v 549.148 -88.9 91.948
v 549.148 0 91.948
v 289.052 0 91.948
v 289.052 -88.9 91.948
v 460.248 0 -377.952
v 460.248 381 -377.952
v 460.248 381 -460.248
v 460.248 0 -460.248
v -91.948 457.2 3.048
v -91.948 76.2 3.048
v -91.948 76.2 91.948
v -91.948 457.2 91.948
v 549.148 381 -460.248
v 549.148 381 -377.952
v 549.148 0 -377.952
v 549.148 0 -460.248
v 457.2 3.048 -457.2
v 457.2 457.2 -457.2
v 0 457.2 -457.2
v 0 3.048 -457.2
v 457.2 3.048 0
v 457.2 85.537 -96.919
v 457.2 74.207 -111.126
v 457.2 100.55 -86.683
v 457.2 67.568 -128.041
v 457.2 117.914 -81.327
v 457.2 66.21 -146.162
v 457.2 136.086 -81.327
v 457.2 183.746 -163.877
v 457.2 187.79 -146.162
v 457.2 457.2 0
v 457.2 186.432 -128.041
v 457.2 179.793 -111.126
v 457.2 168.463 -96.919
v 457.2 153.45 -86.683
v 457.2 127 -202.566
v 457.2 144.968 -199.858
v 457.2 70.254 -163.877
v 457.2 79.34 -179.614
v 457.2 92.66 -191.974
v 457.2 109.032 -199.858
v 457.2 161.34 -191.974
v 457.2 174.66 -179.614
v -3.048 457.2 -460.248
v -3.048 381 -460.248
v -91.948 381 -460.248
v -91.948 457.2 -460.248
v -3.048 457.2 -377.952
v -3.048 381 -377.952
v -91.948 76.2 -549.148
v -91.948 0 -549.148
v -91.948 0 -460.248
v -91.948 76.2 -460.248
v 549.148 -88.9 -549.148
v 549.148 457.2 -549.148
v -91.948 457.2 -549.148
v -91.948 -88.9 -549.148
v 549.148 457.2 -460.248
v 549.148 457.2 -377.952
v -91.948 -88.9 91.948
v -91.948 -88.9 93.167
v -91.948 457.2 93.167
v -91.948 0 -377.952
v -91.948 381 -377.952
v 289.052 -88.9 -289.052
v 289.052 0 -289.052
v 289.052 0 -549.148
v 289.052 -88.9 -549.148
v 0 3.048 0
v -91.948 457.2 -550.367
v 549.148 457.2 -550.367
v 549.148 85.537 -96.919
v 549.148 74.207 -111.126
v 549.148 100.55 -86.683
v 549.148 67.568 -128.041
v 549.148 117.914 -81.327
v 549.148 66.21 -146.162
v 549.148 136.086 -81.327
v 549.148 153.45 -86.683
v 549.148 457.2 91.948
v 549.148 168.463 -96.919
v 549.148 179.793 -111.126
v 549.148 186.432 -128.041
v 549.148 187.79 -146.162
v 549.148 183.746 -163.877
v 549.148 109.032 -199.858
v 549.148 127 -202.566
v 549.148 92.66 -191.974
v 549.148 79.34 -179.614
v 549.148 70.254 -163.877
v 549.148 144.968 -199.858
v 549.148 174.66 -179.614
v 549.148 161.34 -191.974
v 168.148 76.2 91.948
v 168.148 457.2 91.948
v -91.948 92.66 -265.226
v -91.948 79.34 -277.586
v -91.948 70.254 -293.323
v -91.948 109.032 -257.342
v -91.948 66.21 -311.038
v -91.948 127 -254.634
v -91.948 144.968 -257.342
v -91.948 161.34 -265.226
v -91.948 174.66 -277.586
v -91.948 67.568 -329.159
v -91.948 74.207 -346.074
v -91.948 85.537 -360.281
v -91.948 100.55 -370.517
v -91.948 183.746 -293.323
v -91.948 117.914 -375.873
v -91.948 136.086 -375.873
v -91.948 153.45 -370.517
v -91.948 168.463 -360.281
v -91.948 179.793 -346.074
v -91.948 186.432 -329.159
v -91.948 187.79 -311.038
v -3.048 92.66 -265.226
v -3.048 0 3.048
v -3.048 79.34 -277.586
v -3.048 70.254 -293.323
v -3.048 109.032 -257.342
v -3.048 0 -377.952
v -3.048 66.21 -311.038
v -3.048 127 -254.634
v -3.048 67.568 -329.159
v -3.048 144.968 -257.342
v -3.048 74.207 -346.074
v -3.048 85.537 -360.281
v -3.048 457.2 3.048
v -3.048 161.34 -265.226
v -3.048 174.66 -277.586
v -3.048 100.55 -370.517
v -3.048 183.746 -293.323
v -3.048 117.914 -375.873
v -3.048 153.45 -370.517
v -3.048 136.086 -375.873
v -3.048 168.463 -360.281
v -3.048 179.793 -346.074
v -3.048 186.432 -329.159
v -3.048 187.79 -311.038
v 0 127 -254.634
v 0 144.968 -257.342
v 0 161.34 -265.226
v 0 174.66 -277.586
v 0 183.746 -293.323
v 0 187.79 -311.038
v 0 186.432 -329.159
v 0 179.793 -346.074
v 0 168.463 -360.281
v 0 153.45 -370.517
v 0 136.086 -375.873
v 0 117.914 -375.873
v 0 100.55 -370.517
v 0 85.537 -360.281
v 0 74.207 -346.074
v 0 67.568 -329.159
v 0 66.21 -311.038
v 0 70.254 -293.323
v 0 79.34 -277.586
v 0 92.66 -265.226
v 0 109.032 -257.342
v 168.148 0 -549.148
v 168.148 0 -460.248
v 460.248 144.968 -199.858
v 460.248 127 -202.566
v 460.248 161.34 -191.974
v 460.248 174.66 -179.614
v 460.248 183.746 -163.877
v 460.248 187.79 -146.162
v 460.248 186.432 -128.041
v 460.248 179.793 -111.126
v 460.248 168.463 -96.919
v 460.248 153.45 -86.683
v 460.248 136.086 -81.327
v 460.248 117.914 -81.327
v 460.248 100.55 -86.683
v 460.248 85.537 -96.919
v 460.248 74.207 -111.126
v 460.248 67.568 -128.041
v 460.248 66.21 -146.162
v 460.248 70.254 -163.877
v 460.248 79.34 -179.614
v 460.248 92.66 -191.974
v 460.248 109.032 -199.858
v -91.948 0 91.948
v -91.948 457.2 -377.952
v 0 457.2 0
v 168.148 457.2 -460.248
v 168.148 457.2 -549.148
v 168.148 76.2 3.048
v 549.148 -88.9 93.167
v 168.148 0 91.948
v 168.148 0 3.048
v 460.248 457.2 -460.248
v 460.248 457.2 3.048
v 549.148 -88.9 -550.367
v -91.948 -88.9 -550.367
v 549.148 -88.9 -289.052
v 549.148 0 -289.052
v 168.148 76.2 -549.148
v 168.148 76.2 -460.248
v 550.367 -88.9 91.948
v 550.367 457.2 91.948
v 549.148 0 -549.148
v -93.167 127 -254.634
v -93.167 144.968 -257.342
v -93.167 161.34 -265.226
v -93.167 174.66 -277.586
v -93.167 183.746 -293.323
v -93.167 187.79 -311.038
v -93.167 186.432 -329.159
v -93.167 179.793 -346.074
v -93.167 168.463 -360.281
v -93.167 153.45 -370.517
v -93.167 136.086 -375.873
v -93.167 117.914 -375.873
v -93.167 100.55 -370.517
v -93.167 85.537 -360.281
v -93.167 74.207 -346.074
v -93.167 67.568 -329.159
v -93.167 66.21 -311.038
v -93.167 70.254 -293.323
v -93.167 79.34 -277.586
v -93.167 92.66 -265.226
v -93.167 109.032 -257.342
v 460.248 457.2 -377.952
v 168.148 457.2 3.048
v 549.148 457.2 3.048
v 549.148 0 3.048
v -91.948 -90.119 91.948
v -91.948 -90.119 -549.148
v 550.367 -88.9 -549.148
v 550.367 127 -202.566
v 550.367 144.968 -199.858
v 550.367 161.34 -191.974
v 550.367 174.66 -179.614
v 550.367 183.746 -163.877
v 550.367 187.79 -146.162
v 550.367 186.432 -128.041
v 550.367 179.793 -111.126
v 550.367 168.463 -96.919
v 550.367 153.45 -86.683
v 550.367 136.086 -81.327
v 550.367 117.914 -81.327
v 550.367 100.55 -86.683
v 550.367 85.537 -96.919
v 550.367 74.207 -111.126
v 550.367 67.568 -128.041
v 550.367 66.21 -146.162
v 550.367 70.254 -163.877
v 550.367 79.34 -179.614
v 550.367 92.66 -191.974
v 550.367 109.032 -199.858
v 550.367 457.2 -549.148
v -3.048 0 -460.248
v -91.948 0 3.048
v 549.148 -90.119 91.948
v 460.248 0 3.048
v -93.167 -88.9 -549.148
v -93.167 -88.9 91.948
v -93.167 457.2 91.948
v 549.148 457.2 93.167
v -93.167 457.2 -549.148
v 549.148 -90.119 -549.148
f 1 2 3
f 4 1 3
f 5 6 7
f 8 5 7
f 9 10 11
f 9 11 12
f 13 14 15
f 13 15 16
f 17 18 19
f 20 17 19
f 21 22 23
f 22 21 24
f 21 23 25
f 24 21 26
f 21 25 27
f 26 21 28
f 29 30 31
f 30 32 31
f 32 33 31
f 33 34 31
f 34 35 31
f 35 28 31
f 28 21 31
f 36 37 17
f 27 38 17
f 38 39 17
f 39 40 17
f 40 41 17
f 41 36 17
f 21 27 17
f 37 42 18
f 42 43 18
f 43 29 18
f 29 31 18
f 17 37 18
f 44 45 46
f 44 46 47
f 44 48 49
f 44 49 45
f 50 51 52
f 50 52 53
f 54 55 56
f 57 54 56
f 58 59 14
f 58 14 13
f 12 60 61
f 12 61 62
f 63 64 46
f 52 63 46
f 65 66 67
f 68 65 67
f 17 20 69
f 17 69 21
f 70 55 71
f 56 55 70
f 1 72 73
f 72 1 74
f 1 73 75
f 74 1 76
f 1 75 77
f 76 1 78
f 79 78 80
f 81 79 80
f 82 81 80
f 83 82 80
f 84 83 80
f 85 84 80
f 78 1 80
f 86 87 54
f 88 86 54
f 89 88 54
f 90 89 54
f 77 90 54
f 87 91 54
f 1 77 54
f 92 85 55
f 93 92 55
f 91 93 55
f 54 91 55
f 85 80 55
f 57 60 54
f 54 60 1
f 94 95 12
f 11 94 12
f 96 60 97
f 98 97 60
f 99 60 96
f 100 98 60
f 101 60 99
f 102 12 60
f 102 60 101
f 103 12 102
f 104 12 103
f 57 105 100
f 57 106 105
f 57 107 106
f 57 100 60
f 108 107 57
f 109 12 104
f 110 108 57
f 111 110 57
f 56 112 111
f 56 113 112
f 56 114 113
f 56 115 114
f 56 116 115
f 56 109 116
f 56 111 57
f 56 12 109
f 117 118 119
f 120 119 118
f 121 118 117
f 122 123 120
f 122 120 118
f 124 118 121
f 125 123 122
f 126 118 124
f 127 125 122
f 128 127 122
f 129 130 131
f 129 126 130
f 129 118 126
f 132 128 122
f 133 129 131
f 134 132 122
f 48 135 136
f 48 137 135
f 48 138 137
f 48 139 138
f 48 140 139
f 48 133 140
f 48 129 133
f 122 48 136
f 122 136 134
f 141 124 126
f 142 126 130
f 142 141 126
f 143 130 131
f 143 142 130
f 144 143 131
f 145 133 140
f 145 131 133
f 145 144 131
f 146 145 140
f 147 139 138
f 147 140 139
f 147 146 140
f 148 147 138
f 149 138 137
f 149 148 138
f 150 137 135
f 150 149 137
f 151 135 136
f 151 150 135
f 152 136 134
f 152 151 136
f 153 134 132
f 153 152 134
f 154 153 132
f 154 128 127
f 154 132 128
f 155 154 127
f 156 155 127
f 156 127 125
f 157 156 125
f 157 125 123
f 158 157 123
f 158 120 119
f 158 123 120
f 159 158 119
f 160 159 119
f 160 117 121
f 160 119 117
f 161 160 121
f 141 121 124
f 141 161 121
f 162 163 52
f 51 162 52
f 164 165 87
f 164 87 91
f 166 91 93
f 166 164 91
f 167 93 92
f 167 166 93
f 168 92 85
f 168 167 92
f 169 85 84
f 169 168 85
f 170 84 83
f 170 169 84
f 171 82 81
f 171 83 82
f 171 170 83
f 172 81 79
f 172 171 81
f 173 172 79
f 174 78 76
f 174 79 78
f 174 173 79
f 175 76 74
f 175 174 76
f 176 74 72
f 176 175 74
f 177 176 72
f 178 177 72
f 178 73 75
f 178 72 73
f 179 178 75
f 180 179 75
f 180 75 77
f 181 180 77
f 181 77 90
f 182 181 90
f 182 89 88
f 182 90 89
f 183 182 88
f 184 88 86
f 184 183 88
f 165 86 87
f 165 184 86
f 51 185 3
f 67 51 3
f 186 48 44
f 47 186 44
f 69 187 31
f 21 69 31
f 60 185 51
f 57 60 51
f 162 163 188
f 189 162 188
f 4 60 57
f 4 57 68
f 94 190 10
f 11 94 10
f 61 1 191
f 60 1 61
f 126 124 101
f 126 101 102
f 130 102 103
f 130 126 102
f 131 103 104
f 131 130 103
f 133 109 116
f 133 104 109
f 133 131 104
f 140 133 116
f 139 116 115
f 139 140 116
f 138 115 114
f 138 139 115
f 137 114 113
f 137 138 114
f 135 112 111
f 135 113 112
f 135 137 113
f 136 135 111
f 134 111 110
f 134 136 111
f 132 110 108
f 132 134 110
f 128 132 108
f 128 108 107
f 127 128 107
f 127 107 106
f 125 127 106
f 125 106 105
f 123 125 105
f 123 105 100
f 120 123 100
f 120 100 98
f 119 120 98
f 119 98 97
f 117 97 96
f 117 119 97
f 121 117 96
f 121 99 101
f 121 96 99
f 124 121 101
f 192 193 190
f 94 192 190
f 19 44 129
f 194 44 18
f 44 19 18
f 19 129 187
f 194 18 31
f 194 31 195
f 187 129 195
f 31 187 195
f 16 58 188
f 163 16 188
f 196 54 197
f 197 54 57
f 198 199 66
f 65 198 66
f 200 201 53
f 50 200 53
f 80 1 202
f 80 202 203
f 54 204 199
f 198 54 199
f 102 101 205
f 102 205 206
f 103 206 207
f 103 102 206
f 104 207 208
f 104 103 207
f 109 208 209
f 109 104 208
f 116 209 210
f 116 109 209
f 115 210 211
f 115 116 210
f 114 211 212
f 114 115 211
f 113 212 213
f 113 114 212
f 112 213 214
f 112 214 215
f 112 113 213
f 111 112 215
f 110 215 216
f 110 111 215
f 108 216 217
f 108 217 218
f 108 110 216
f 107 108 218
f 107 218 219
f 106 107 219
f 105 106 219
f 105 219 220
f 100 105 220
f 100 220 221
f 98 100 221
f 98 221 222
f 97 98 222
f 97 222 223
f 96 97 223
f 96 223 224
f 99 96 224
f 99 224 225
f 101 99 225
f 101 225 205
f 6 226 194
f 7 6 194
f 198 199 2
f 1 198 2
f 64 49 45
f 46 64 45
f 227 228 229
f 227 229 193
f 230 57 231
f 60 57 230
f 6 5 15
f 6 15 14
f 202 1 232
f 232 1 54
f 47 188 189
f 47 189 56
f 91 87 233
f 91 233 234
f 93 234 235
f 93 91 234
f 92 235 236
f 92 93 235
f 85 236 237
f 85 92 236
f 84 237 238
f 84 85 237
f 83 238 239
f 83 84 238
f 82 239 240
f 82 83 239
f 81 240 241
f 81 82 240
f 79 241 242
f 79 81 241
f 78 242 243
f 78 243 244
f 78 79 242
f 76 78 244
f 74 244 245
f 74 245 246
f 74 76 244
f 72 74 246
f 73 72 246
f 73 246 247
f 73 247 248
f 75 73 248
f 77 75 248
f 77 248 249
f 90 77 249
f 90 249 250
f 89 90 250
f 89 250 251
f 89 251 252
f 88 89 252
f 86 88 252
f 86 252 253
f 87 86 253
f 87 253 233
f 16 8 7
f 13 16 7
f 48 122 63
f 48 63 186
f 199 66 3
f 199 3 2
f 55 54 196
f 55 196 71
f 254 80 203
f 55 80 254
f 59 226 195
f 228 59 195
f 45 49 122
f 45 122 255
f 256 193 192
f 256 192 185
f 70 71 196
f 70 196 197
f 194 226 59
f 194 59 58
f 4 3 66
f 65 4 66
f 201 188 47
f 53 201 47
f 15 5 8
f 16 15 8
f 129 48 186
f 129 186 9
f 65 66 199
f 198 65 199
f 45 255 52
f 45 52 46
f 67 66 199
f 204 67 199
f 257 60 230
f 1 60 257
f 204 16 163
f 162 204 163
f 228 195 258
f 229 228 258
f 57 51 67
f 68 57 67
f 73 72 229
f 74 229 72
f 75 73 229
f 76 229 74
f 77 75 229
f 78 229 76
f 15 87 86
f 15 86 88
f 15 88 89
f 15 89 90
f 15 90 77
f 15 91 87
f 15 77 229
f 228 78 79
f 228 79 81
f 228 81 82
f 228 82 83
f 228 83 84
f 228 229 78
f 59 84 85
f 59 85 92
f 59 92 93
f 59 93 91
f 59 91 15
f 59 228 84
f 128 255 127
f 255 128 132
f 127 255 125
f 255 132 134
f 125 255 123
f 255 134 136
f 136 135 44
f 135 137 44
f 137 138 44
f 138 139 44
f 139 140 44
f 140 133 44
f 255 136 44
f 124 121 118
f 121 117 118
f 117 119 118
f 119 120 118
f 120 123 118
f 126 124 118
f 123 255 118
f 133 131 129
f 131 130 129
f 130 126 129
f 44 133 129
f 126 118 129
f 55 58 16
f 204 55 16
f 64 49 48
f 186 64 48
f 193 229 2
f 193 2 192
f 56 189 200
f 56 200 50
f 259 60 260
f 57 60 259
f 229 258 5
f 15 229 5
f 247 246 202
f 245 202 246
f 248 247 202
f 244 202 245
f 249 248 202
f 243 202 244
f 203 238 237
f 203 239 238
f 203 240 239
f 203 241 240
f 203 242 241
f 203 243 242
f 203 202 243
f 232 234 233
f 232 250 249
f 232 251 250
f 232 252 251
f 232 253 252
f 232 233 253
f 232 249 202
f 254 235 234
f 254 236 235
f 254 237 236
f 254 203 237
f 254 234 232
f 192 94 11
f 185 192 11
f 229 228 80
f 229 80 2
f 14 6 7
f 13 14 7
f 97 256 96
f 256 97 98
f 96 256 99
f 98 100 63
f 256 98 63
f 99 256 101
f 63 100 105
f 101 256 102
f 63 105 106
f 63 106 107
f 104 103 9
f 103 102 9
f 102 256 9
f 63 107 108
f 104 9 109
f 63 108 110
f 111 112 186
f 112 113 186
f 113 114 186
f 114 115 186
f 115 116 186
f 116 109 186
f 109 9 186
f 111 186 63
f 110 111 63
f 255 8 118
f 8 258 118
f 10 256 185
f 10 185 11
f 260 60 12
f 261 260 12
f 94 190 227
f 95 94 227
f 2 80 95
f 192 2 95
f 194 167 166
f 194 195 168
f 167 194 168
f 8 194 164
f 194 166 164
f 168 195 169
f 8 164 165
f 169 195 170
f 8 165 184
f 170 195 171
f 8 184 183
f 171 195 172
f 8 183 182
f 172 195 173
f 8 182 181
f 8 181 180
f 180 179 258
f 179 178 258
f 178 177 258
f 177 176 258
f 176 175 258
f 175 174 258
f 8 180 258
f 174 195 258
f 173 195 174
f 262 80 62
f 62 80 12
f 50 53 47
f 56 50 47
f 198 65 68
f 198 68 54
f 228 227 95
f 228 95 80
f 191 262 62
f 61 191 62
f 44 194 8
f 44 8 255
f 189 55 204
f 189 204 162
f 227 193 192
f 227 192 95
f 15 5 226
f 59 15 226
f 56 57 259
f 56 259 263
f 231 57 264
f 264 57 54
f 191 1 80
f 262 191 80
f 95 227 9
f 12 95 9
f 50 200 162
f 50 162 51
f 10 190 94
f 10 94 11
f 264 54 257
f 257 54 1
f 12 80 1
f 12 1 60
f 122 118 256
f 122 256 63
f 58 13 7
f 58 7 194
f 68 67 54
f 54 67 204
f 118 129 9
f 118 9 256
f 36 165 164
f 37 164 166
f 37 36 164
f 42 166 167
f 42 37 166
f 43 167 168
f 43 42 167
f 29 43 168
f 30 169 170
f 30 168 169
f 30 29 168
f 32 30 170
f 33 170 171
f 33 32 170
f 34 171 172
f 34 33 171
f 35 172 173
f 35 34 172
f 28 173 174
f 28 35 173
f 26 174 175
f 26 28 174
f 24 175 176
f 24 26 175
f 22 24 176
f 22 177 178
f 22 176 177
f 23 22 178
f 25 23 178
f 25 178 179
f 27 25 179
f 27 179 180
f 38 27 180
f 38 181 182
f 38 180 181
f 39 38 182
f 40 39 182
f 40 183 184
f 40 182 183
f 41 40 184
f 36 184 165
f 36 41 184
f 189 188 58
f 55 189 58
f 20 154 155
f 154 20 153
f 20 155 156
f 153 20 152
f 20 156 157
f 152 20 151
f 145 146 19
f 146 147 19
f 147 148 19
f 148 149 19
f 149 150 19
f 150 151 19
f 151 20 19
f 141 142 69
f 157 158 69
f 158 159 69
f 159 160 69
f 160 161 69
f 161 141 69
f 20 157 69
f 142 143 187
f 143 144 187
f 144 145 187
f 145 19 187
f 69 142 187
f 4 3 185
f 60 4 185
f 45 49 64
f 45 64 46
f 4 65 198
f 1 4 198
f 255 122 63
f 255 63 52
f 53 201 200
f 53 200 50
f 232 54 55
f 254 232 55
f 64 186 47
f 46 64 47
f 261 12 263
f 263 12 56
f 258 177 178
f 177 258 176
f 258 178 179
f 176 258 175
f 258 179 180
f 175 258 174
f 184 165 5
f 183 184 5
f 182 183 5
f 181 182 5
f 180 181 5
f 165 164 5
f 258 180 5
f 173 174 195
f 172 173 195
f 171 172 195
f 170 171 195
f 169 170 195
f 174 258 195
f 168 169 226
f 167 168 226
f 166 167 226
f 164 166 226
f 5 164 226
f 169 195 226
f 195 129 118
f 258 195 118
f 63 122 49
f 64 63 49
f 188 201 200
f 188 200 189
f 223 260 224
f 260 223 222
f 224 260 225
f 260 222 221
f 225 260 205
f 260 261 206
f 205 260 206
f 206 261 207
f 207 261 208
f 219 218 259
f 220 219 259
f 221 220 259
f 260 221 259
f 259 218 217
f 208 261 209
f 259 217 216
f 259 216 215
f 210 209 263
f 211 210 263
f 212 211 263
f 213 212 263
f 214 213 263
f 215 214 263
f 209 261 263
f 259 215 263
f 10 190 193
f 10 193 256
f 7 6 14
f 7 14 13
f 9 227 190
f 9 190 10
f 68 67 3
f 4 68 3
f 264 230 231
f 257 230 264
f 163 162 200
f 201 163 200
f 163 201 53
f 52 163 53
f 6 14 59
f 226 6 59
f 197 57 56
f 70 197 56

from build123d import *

# Parameters (mm, degrees)
SKETCH1_W            = 457.2
SKETCH1_H            = 457.2
BOSS_EXTRUDE1_DEPTH  = 3.048
SKETCH2_W            = 457.2
SKETCH2_H            = 457.2
BOSS_EXTRUDE2_DEPTH  = 3.048
SKETCH3_W            = 460.248
SKETCH3_H            = 457.2
BOSS_EXTRUDE3_DEPTH  = 3.048
SKETCH4_W            = 457.2
SKETCH4_H            = 454.152
BOSS_EXTRUDE4_DEPTH  = 3.048
SKETCH5_W            = 457.2
SKETCH5_H            = 454.152
BOSS_EXTRUDE5_DEPTH  = 3.048
BOSS_EXTRUDE6_DEPTH  = 88.9
SKETCH6_3_W          = 82.296
SKETCH6_3_H          = 76.2
BOSS_EXTRUDE7_DEPTH  = 88.9
SKETCH6_4_W          = 82.296
SKETCH6_4_H          = 381
BOSS_EXTRUDE8_DEPTH  = 88.9
SKETCH7_W            = 88.9
SKETCH7_H            = 381
BOSS_EXTRUDE9_DEPTH  = 88.9
SKETCH7_3_W          = 260.096
SKETCH7_3_H          = 381
BOSS_EXTRUDE10_DEPTH = 88.9
SKETCH7_4_W          = 260.096
SKETCH7_4_H          = 76.2
BOSS_EXTRUDE11_DEPTH = 88.9
BOSS_EXTRUDE12_DEPTH = 88.9
SKETCH8_3_W          = 171.196
SKETCH8_3_H          = 292.1
BOSS_EXTRUDE13_DEPTH = 88.9
SKETCH8_4_W          = 171.196
SKETCH8_4_H          = 171.196
BOSS_EXTRUDE14_DEPTH = 88.9
SKETCH9_W            = 641.096
SKETCH9_H            = 546.1
BOSS_EXTRUDE15_DEPTH = 1.2192
SKETCH10_W           = 641.096
SKETCH10_H           = 546.1
BOSS_EXTRUDE16_DEPTH = 1.2192
SKETCH11_W           = 641.096
SKETCH11_H           = 641.096
BOSS_EXTRUDE17_DEPTH = 1.2192
CUT_EXTRUDE1_START   = -93.1672
SKETCH12_R           = 60.96
CUT_EXTRUDE1_DEPTH   = 93.1672
CIRPATTERN1_COUNT    = 2


with BuildPart() as part:
    # Sketch1 → Boss-Extrude1 (new body)
    with BuildSketch(Plane(origin=(0, 0, 0), x_dir=(1, 0, 0), z_dir=(0, 1, 0))):
        with Locations((228.6, 228.6)):
            Rectangle(SKETCH1_W, SKETCH1_H)
    extrude(amount=BOSS_EXTRUDE1_DEPTH)

    # Sketch2 → Boss-Extrude2 (add)
    with BuildSketch(Plane.ZY):
        with Locations((-228.6, 228.6)):
            Rectangle(SKETCH2_W, SKETCH2_H)
    extrude(amount=BOSS_EXTRUDE2_DEPTH)

    # Sketch3 → Boss-Extrude3 (add)
    with BuildSketch(Plane.XY):
        with Locations((227.076, 228.6)):
            Rectangle(SKETCH3_W, SKETCH3_H)
    extrude(amount=BOSS_EXTRUDE3_DEPTH)

    # Sketch4 → Boss-Extrude4 (add)
    with BuildSketch(Plane(origin=(457.2, 0, 0), x_dir=(0, 0, -1), z_dir=(1, 0, 0))):
        Polygon((-3.048, 457.2), (-3.048, 0), (457.2, 0), (457.2, 3.048), (0, 3.048), (0, 457.2), align=None)
        with Locations((228.6, 230.124)):
            Rectangle(SKETCH4_W, SKETCH4_H)
    extrude(amount=BOSS_EXTRUDE4_DEPTH)

    # Sketch5 → Boss-Extrude5 (add)
    with BuildSketch(Plane(origin=(0, 0, -457.2), x_dir=(-1, 0, 0), z_dir=(0, 0, -1))):
        with Locations((-228.6, 230.124)):
            Rectangle(SKETCH5_W, SKETCH5_H)
        Polygon((-460.248, 457.2), (-460.248, 0), (3.048, 0), (3.048, 457.2), (0, 457.2), (0, 3.048), (-457.2, 3.048), (-457.2, 457.2), align=None)
    extrude(amount=BOSS_EXTRUDE5_DEPTH)


with BuildPart() as body_2:
    # Sketch6 → Boss-Extrude6 (new body)
    with BuildSketch(Plane(origin=(460.248, 0, 0), x_dir=(0, 0, -1), z_dir=(1, 0, 0))):
        Polygon((377.952, 457.2), (-3.048, 457.2), (-3.048, 0), (377.952, 0), (377.952, 381), align=None)
    extrude(amount=BOSS_EXTRUDE6_DEPTH)


with BuildPart() as body_3:
    # Sketch6<3> → Boss-Extrude7 (new body)
    with BuildSketch(Plane(origin=(460.248, 0, 0), x_dir=(0, 0, -1), z_dir=(1, 0, 0))):
        with Locations((419.1, 419.1)):
            Rectangle(SKETCH6_3_W, SKETCH6_3_H)
    extrude(amount=BOSS_EXTRUDE7_DEPTH)


with BuildPart() as body_4:
    # Sketch6<4> → Boss-Extrude8 (new body)
    with BuildSketch(Plane(origin=(460.248, 0, 0), x_dir=(0, 0, -1), z_dir=(1, 0, 0))):
        with Locations((419.1, 190.5)):
            Rectangle(SKETCH6_4_W, SKETCH6_4_H)
    extrude(amount=BOSS_EXTRUDE8_DEPTH)


with BuildPart() as body_5:
    # Mirror1: mirrored copy
    add(body_3.part.mirror(Plane(origin=(228.6, 0, 0), x_dir=(0, 0, 1), z_dir=(1, 0, 0))))


with BuildPart() as body_6:
    # Mirror1 2: mirrored copy
    add(body_2.part.mirror(Plane(origin=(228.6, 0, 0), x_dir=(0, 0, 1), z_dir=(1, 0, 0))))


with BuildPart() as body_7:
    # Mirror1 3: mirrored copy
    add(body_4.part.mirror(Plane(origin=(228.6, 0, 0), x_dir=(0, 0, 1), z_dir=(1, 0, 0))))


with BuildPart() as body_8:
    # Sketch7 → Boss-Extrude9 (new body)
    with BuildSketch(Plane(origin=(0, 0, -460.248), x_dir=(-1, 0, 0), z_dir=(0, 0, -1))):
        Polygon((-168.148, 457.2), (-549.148, 457.2), (-549.148, 381), (-460.248, 381), (-460.248, 0), (-168.148, 0), (-168.148, 76.2), align=None)
        with Locations((-504.698, 190.5)):
            Rectangle(SKETCH7_W, SKETCH7_H)
    extrude(amount=BOSS_EXTRUDE9_DEPTH)


with BuildPart() as body_9:
    # Sketch7<3> → Boss-Extrude10 (new body)
    with BuildSketch(Plane(origin=(0, 0, -460.248), x_dir=(-1, 0, 0), z_dir=(0, 0, -1))):
        with Locations((-38.1, 266.7)):
            Rectangle(SKETCH7_3_W, SKETCH7_3_H)
    extrude(amount=BOSS_EXTRUDE10_DEPTH)


with BuildPart() as body_10:
    # Sketch7<4> → Boss-Extrude11 (new body)
    with BuildSketch(Plane(origin=(0, 0, -460.248), x_dir=(-1, 0, 0), z_dir=(0, 0, -1))):
        with Locations((-38.1, 38.1)):
            Rectangle(SKETCH7_4_W, SKETCH7_4_H)
    extrude(amount=BOSS_EXTRUDE11_DEPTH)


with BuildPart() as body_11:
    # Mirror2: mirrored copy
    add(body_9.part.mirror(Plane(origin=(0, 0, -228.6), x_dir=(1, 0, 0), z_dir=(0, 0, -1))))


with BuildPart() as body_12:
    # Mirror2 2: mirrored copy
    add(body_8.part.mirror(Plane(origin=(0, 0, -228.6), x_dir=(1, 0, 0), z_dir=(0, 0, -1))))


with BuildPart() as body_13:
    # Mirror2 3: mirrored copy
    add(body_10.part.mirror(Plane(origin=(0, 0, -228.6), x_dir=(1, 0, 0), z_dir=(0, 0, -1))))


with BuildPart() as body_14:
    # Sketch8 → Boss-Extrude12 (new body)
    with BuildSketch(Plane.XZ):
        Polygon((289.052, -289.052), (289.052, 3.048), (-3.048, 3.048), (-3.048, -460.248), (289.052, -460.248), align=None)
        Polygon((289.052, 91.948), (-91.948, 91.948), (-91.948, -549.148), (289.052, -549.148), (289.052, -460.248), (-3.048, -460.248), (-3.048, 3.048), (289.052, 3.048), align=None)
    extrude(amount=BOSS_EXTRUDE12_DEPTH)


with BuildPart() as body_15:
    # Sketch8<3> → Boss-Extrude13 (new body)
    with BuildSketch(Plane.XZ):
        with Locations((374.65, -143.002)):
            Rectangle(SKETCH8_3_W, SKETCH8_3_H)
        Polygon((549.148, 91.948), (289.052, 91.948), (289.052, 3.048), (460.248, 3.048), (460.248, -289.052), (549.148, -289.052), align=None)
    extrude(amount=BOSS_EXTRUDE13_DEPTH)


with BuildPart() as body_16:
    # Sketch8<4> → Boss-Extrude14 (new body)
    with BuildSketch(Plane.XZ):
        with Locations((374.65, -374.65)):
            Rectangle(SKETCH8_4_W, SKETCH8_4_H)
        Polygon((289.052, -460.248), (289.052, -549.148), (549.148, -549.148), (549.148, -289.052), (460.248, -289.052), (460.248, -460.248), align=None)
    extrude(amount=BOSS_EXTRUDE14_DEPTH)


with BuildPart() as body_17:
    # Sketch9 → Boss-Extrude15 (new body)
    with BuildSketch(Plane(origin=(549.148, 0, 0), x_dir=(0, 0, -1), z_dir=(1, 0, 0))):
        with Locations((228.6, 184.15)):
            Rectangle(SKETCH9_W, SKETCH9_H)
    extrude(amount=BOSS_EXTRUDE15_DEPTH)


with BuildPart() as body_18:
    # Sketch10 → Boss-Extrude16 (new body)
    with BuildSketch(Plane(origin=(0, 0, -549.148), x_dir=(-1, 0, 0), z_dir=(0, 0, -1))):
        with Locations((-228.6, 184.15)):
            Rectangle(SKETCH10_W, SKETCH10_H)
    extrude(amount=BOSS_EXTRUDE16_DEPTH)


with BuildPart() as body_19:
    # Mirror3: mirrored copy
    add(body_17.part.mirror(Plane(origin=(228.6, 0, 0), x_dir=(0, 0, 1), z_dir=(1, 0, 0))))


with BuildPart() as body_20:
    # Mirror4: mirrored copy
    add(body_18.part.mirror(Plane(origin=(0, 0, -228.6), x_dir=(1, 0, 0), z_dir=(0, 0, -1))))


with BuildPart() as body_21:
    # Sketch11 → Boss-Extrude17 (new body)
    with BuildSketch(Plane.XZ.offset(88.9)):
        with Locations((228.6, -228.6)):
            Rectangle(SKETCH11_W, SKETCH11_H)
    extrude(amount=BOSS_EXTRUDE17_DEPTH)


with BuildPart() as cut_extrude1_tool:
    # Sketch12 → Cut-Extrude1 (new body)
    with BuildSketch(Plane.ZY.offset(93.1672).offset(CUT_EXTRUDE1_START)):
        with Locations((-315.593802346, 127)):
            Circle(SKETCH12_R)
    cut_extrude1 = extrude(amount=CUT_EXTRUDE1_DEPTH)


with BuildPart() as part_1:
    add(part.part)

    # Cut-Extrude1: cut by cut_extrude1_tool
    add(cut_extrude1_tool.part, mode=Mode.SUBTRACT)


with BuildPart() as body_6_1:
    add(body_6.part)

    # Cut-Extrude1: cut by cut_extrude1_tool
    add(cut_extrude1_tool.part, mode=Mode.SUBTRACT)


with BuildPart() as body_19_1:
    add(body_19.part)

    # Cut-Extrude1: cut by cut_extrude1_tool
    add(cut_extrude1_tool.part, mode=Mode.SUBTRACT)


with BuildPart() as cirpattern1_tool:
    # CirPattern1: Cut-Extrude1 ×2 about axis
    cirpattern1_axis = Axis((228.6, 479.9076, -228.6), (0, -1, 0))
    for i in range(1, CIRPATTERN1_COUNT):
        add(cut_extrude1.rotate(cirpattern1_axis, i * 360 / CIRPATTERN1_COUNT))


with BuildPart() as part_2:
    add(part_1.part)

    # CirPattern1: cut by cirpattern1_tool
    add(cirpattern1_tool.part, mode=Mode.SUBTRACT)


with BuildPart() as body_2_1:
    add(body_2.part)

    # CirPattern1: cut by cirpattern1_tool
    add(cirpattern1_tool.part, mode=Mode.SUBTRACT)


with BuildPart() as body_17_1:
    add(body_17.part)

    # CirPattern1: cut by cirpattern1_tool
    add(cirpattern1_tool.part, mode=Mode.SUBTRACT)


solid = Compound([body_3.part, body_4.part, body_5.part, body_7.part, body_8.part, body_9.part, body_10.part, body_11.part, body_12.part, body_13.part, body_14.part, body_15.part, body_16.part, body_18.part, body_20.part, body_21.part, body_6_1.part, body_19_1.part, part_2.part, body_2_1.part, body_17_1.part])
